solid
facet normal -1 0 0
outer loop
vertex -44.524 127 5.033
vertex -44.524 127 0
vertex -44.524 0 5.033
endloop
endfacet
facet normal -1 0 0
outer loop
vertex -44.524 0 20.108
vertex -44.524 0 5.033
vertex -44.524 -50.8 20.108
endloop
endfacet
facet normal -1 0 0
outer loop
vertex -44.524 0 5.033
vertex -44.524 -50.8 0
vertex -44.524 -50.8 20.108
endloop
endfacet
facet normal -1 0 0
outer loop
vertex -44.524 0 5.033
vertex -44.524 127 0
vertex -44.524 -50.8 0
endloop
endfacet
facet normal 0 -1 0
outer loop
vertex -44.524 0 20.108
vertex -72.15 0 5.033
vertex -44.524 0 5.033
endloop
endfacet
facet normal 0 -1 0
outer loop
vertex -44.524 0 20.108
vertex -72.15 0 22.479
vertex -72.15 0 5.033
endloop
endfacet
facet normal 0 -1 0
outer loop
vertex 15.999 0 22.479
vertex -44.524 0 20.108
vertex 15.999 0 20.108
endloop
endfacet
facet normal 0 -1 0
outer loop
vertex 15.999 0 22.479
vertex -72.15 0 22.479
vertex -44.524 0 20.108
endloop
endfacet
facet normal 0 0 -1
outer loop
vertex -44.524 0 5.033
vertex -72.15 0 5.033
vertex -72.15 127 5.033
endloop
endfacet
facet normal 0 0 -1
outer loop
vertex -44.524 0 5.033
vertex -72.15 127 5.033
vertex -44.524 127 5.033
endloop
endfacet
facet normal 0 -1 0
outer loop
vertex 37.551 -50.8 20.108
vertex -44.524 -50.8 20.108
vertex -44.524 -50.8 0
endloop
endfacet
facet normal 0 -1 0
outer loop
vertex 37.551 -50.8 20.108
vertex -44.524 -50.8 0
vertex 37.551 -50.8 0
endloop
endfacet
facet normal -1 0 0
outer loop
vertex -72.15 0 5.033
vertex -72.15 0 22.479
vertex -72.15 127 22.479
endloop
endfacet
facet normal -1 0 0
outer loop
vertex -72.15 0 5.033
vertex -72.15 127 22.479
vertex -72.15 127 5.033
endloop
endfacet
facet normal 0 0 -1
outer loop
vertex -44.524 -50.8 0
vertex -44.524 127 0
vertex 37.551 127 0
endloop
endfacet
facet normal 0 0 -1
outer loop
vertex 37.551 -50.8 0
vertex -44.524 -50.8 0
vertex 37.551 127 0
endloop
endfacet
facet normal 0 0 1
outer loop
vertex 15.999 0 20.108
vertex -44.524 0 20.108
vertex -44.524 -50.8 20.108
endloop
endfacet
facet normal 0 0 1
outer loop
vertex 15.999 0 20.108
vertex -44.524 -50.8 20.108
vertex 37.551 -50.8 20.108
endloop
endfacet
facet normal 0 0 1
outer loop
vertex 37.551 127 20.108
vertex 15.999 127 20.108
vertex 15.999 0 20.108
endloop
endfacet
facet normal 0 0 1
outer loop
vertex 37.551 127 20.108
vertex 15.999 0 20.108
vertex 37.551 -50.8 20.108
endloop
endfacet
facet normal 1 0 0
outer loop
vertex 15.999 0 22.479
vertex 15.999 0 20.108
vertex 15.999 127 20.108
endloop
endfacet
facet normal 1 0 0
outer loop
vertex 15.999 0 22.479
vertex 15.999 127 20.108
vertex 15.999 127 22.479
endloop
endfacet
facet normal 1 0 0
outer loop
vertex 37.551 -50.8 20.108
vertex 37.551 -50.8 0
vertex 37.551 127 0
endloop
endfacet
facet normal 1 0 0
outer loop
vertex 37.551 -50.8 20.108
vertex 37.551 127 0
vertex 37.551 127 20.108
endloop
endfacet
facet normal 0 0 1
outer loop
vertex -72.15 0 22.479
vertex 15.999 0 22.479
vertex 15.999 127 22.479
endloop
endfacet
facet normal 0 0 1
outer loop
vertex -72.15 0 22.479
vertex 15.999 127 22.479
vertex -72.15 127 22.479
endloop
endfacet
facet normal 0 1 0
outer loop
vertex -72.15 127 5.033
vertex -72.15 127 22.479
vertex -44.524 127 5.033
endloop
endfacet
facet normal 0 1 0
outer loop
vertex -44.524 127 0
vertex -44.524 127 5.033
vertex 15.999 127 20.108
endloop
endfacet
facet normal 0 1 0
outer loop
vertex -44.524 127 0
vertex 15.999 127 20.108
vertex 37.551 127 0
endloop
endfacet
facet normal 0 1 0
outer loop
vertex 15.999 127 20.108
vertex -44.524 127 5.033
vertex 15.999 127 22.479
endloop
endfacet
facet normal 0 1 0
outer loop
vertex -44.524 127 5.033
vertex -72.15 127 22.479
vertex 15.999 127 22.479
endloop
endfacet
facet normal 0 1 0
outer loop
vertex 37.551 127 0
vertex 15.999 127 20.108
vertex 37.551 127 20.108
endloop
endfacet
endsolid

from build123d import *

# Parameters (mm, degrees)
F1_W     = 82.0750407875
F1_H     = 20.1075039804
F2_DEPTH = 50.7999993861
F0_W     = 82.0750407875
F0_H     = 20.1075039804
F4_DEPTH = 127


with BuildPart() as f2:
    # F1 (on face) → F2 (new body)
    with BuildSketch(Plane.XZ):
        with Locations((-3.4862887114, 10.0537519902)):
            Rectangle(F1_W, F1_H)
    extrude(amount=F2_DEPTH)

    # F3 (on face) + F0 (on Front) → F4 (join)
    with BuildSketch(Plane.XZ):
        Polygon((-72.149567306, 5.0325542688), (-44.5238091052, 5.0325542688), (-44.5238091052, 20.1075039804), (15.9993991256, 20.1075039804), (15.9993991256, 22.4787890911), (-72.149567306, 22.4787890911), align=None)
    with BuildSketch(Plane.XZ):
        with Locations((-3.4862887114, 10.0537519902)):
            Rectangle(F0_W, F0_H)
    extrude(amount=-F4_DEPTH)


solid = f2.part
